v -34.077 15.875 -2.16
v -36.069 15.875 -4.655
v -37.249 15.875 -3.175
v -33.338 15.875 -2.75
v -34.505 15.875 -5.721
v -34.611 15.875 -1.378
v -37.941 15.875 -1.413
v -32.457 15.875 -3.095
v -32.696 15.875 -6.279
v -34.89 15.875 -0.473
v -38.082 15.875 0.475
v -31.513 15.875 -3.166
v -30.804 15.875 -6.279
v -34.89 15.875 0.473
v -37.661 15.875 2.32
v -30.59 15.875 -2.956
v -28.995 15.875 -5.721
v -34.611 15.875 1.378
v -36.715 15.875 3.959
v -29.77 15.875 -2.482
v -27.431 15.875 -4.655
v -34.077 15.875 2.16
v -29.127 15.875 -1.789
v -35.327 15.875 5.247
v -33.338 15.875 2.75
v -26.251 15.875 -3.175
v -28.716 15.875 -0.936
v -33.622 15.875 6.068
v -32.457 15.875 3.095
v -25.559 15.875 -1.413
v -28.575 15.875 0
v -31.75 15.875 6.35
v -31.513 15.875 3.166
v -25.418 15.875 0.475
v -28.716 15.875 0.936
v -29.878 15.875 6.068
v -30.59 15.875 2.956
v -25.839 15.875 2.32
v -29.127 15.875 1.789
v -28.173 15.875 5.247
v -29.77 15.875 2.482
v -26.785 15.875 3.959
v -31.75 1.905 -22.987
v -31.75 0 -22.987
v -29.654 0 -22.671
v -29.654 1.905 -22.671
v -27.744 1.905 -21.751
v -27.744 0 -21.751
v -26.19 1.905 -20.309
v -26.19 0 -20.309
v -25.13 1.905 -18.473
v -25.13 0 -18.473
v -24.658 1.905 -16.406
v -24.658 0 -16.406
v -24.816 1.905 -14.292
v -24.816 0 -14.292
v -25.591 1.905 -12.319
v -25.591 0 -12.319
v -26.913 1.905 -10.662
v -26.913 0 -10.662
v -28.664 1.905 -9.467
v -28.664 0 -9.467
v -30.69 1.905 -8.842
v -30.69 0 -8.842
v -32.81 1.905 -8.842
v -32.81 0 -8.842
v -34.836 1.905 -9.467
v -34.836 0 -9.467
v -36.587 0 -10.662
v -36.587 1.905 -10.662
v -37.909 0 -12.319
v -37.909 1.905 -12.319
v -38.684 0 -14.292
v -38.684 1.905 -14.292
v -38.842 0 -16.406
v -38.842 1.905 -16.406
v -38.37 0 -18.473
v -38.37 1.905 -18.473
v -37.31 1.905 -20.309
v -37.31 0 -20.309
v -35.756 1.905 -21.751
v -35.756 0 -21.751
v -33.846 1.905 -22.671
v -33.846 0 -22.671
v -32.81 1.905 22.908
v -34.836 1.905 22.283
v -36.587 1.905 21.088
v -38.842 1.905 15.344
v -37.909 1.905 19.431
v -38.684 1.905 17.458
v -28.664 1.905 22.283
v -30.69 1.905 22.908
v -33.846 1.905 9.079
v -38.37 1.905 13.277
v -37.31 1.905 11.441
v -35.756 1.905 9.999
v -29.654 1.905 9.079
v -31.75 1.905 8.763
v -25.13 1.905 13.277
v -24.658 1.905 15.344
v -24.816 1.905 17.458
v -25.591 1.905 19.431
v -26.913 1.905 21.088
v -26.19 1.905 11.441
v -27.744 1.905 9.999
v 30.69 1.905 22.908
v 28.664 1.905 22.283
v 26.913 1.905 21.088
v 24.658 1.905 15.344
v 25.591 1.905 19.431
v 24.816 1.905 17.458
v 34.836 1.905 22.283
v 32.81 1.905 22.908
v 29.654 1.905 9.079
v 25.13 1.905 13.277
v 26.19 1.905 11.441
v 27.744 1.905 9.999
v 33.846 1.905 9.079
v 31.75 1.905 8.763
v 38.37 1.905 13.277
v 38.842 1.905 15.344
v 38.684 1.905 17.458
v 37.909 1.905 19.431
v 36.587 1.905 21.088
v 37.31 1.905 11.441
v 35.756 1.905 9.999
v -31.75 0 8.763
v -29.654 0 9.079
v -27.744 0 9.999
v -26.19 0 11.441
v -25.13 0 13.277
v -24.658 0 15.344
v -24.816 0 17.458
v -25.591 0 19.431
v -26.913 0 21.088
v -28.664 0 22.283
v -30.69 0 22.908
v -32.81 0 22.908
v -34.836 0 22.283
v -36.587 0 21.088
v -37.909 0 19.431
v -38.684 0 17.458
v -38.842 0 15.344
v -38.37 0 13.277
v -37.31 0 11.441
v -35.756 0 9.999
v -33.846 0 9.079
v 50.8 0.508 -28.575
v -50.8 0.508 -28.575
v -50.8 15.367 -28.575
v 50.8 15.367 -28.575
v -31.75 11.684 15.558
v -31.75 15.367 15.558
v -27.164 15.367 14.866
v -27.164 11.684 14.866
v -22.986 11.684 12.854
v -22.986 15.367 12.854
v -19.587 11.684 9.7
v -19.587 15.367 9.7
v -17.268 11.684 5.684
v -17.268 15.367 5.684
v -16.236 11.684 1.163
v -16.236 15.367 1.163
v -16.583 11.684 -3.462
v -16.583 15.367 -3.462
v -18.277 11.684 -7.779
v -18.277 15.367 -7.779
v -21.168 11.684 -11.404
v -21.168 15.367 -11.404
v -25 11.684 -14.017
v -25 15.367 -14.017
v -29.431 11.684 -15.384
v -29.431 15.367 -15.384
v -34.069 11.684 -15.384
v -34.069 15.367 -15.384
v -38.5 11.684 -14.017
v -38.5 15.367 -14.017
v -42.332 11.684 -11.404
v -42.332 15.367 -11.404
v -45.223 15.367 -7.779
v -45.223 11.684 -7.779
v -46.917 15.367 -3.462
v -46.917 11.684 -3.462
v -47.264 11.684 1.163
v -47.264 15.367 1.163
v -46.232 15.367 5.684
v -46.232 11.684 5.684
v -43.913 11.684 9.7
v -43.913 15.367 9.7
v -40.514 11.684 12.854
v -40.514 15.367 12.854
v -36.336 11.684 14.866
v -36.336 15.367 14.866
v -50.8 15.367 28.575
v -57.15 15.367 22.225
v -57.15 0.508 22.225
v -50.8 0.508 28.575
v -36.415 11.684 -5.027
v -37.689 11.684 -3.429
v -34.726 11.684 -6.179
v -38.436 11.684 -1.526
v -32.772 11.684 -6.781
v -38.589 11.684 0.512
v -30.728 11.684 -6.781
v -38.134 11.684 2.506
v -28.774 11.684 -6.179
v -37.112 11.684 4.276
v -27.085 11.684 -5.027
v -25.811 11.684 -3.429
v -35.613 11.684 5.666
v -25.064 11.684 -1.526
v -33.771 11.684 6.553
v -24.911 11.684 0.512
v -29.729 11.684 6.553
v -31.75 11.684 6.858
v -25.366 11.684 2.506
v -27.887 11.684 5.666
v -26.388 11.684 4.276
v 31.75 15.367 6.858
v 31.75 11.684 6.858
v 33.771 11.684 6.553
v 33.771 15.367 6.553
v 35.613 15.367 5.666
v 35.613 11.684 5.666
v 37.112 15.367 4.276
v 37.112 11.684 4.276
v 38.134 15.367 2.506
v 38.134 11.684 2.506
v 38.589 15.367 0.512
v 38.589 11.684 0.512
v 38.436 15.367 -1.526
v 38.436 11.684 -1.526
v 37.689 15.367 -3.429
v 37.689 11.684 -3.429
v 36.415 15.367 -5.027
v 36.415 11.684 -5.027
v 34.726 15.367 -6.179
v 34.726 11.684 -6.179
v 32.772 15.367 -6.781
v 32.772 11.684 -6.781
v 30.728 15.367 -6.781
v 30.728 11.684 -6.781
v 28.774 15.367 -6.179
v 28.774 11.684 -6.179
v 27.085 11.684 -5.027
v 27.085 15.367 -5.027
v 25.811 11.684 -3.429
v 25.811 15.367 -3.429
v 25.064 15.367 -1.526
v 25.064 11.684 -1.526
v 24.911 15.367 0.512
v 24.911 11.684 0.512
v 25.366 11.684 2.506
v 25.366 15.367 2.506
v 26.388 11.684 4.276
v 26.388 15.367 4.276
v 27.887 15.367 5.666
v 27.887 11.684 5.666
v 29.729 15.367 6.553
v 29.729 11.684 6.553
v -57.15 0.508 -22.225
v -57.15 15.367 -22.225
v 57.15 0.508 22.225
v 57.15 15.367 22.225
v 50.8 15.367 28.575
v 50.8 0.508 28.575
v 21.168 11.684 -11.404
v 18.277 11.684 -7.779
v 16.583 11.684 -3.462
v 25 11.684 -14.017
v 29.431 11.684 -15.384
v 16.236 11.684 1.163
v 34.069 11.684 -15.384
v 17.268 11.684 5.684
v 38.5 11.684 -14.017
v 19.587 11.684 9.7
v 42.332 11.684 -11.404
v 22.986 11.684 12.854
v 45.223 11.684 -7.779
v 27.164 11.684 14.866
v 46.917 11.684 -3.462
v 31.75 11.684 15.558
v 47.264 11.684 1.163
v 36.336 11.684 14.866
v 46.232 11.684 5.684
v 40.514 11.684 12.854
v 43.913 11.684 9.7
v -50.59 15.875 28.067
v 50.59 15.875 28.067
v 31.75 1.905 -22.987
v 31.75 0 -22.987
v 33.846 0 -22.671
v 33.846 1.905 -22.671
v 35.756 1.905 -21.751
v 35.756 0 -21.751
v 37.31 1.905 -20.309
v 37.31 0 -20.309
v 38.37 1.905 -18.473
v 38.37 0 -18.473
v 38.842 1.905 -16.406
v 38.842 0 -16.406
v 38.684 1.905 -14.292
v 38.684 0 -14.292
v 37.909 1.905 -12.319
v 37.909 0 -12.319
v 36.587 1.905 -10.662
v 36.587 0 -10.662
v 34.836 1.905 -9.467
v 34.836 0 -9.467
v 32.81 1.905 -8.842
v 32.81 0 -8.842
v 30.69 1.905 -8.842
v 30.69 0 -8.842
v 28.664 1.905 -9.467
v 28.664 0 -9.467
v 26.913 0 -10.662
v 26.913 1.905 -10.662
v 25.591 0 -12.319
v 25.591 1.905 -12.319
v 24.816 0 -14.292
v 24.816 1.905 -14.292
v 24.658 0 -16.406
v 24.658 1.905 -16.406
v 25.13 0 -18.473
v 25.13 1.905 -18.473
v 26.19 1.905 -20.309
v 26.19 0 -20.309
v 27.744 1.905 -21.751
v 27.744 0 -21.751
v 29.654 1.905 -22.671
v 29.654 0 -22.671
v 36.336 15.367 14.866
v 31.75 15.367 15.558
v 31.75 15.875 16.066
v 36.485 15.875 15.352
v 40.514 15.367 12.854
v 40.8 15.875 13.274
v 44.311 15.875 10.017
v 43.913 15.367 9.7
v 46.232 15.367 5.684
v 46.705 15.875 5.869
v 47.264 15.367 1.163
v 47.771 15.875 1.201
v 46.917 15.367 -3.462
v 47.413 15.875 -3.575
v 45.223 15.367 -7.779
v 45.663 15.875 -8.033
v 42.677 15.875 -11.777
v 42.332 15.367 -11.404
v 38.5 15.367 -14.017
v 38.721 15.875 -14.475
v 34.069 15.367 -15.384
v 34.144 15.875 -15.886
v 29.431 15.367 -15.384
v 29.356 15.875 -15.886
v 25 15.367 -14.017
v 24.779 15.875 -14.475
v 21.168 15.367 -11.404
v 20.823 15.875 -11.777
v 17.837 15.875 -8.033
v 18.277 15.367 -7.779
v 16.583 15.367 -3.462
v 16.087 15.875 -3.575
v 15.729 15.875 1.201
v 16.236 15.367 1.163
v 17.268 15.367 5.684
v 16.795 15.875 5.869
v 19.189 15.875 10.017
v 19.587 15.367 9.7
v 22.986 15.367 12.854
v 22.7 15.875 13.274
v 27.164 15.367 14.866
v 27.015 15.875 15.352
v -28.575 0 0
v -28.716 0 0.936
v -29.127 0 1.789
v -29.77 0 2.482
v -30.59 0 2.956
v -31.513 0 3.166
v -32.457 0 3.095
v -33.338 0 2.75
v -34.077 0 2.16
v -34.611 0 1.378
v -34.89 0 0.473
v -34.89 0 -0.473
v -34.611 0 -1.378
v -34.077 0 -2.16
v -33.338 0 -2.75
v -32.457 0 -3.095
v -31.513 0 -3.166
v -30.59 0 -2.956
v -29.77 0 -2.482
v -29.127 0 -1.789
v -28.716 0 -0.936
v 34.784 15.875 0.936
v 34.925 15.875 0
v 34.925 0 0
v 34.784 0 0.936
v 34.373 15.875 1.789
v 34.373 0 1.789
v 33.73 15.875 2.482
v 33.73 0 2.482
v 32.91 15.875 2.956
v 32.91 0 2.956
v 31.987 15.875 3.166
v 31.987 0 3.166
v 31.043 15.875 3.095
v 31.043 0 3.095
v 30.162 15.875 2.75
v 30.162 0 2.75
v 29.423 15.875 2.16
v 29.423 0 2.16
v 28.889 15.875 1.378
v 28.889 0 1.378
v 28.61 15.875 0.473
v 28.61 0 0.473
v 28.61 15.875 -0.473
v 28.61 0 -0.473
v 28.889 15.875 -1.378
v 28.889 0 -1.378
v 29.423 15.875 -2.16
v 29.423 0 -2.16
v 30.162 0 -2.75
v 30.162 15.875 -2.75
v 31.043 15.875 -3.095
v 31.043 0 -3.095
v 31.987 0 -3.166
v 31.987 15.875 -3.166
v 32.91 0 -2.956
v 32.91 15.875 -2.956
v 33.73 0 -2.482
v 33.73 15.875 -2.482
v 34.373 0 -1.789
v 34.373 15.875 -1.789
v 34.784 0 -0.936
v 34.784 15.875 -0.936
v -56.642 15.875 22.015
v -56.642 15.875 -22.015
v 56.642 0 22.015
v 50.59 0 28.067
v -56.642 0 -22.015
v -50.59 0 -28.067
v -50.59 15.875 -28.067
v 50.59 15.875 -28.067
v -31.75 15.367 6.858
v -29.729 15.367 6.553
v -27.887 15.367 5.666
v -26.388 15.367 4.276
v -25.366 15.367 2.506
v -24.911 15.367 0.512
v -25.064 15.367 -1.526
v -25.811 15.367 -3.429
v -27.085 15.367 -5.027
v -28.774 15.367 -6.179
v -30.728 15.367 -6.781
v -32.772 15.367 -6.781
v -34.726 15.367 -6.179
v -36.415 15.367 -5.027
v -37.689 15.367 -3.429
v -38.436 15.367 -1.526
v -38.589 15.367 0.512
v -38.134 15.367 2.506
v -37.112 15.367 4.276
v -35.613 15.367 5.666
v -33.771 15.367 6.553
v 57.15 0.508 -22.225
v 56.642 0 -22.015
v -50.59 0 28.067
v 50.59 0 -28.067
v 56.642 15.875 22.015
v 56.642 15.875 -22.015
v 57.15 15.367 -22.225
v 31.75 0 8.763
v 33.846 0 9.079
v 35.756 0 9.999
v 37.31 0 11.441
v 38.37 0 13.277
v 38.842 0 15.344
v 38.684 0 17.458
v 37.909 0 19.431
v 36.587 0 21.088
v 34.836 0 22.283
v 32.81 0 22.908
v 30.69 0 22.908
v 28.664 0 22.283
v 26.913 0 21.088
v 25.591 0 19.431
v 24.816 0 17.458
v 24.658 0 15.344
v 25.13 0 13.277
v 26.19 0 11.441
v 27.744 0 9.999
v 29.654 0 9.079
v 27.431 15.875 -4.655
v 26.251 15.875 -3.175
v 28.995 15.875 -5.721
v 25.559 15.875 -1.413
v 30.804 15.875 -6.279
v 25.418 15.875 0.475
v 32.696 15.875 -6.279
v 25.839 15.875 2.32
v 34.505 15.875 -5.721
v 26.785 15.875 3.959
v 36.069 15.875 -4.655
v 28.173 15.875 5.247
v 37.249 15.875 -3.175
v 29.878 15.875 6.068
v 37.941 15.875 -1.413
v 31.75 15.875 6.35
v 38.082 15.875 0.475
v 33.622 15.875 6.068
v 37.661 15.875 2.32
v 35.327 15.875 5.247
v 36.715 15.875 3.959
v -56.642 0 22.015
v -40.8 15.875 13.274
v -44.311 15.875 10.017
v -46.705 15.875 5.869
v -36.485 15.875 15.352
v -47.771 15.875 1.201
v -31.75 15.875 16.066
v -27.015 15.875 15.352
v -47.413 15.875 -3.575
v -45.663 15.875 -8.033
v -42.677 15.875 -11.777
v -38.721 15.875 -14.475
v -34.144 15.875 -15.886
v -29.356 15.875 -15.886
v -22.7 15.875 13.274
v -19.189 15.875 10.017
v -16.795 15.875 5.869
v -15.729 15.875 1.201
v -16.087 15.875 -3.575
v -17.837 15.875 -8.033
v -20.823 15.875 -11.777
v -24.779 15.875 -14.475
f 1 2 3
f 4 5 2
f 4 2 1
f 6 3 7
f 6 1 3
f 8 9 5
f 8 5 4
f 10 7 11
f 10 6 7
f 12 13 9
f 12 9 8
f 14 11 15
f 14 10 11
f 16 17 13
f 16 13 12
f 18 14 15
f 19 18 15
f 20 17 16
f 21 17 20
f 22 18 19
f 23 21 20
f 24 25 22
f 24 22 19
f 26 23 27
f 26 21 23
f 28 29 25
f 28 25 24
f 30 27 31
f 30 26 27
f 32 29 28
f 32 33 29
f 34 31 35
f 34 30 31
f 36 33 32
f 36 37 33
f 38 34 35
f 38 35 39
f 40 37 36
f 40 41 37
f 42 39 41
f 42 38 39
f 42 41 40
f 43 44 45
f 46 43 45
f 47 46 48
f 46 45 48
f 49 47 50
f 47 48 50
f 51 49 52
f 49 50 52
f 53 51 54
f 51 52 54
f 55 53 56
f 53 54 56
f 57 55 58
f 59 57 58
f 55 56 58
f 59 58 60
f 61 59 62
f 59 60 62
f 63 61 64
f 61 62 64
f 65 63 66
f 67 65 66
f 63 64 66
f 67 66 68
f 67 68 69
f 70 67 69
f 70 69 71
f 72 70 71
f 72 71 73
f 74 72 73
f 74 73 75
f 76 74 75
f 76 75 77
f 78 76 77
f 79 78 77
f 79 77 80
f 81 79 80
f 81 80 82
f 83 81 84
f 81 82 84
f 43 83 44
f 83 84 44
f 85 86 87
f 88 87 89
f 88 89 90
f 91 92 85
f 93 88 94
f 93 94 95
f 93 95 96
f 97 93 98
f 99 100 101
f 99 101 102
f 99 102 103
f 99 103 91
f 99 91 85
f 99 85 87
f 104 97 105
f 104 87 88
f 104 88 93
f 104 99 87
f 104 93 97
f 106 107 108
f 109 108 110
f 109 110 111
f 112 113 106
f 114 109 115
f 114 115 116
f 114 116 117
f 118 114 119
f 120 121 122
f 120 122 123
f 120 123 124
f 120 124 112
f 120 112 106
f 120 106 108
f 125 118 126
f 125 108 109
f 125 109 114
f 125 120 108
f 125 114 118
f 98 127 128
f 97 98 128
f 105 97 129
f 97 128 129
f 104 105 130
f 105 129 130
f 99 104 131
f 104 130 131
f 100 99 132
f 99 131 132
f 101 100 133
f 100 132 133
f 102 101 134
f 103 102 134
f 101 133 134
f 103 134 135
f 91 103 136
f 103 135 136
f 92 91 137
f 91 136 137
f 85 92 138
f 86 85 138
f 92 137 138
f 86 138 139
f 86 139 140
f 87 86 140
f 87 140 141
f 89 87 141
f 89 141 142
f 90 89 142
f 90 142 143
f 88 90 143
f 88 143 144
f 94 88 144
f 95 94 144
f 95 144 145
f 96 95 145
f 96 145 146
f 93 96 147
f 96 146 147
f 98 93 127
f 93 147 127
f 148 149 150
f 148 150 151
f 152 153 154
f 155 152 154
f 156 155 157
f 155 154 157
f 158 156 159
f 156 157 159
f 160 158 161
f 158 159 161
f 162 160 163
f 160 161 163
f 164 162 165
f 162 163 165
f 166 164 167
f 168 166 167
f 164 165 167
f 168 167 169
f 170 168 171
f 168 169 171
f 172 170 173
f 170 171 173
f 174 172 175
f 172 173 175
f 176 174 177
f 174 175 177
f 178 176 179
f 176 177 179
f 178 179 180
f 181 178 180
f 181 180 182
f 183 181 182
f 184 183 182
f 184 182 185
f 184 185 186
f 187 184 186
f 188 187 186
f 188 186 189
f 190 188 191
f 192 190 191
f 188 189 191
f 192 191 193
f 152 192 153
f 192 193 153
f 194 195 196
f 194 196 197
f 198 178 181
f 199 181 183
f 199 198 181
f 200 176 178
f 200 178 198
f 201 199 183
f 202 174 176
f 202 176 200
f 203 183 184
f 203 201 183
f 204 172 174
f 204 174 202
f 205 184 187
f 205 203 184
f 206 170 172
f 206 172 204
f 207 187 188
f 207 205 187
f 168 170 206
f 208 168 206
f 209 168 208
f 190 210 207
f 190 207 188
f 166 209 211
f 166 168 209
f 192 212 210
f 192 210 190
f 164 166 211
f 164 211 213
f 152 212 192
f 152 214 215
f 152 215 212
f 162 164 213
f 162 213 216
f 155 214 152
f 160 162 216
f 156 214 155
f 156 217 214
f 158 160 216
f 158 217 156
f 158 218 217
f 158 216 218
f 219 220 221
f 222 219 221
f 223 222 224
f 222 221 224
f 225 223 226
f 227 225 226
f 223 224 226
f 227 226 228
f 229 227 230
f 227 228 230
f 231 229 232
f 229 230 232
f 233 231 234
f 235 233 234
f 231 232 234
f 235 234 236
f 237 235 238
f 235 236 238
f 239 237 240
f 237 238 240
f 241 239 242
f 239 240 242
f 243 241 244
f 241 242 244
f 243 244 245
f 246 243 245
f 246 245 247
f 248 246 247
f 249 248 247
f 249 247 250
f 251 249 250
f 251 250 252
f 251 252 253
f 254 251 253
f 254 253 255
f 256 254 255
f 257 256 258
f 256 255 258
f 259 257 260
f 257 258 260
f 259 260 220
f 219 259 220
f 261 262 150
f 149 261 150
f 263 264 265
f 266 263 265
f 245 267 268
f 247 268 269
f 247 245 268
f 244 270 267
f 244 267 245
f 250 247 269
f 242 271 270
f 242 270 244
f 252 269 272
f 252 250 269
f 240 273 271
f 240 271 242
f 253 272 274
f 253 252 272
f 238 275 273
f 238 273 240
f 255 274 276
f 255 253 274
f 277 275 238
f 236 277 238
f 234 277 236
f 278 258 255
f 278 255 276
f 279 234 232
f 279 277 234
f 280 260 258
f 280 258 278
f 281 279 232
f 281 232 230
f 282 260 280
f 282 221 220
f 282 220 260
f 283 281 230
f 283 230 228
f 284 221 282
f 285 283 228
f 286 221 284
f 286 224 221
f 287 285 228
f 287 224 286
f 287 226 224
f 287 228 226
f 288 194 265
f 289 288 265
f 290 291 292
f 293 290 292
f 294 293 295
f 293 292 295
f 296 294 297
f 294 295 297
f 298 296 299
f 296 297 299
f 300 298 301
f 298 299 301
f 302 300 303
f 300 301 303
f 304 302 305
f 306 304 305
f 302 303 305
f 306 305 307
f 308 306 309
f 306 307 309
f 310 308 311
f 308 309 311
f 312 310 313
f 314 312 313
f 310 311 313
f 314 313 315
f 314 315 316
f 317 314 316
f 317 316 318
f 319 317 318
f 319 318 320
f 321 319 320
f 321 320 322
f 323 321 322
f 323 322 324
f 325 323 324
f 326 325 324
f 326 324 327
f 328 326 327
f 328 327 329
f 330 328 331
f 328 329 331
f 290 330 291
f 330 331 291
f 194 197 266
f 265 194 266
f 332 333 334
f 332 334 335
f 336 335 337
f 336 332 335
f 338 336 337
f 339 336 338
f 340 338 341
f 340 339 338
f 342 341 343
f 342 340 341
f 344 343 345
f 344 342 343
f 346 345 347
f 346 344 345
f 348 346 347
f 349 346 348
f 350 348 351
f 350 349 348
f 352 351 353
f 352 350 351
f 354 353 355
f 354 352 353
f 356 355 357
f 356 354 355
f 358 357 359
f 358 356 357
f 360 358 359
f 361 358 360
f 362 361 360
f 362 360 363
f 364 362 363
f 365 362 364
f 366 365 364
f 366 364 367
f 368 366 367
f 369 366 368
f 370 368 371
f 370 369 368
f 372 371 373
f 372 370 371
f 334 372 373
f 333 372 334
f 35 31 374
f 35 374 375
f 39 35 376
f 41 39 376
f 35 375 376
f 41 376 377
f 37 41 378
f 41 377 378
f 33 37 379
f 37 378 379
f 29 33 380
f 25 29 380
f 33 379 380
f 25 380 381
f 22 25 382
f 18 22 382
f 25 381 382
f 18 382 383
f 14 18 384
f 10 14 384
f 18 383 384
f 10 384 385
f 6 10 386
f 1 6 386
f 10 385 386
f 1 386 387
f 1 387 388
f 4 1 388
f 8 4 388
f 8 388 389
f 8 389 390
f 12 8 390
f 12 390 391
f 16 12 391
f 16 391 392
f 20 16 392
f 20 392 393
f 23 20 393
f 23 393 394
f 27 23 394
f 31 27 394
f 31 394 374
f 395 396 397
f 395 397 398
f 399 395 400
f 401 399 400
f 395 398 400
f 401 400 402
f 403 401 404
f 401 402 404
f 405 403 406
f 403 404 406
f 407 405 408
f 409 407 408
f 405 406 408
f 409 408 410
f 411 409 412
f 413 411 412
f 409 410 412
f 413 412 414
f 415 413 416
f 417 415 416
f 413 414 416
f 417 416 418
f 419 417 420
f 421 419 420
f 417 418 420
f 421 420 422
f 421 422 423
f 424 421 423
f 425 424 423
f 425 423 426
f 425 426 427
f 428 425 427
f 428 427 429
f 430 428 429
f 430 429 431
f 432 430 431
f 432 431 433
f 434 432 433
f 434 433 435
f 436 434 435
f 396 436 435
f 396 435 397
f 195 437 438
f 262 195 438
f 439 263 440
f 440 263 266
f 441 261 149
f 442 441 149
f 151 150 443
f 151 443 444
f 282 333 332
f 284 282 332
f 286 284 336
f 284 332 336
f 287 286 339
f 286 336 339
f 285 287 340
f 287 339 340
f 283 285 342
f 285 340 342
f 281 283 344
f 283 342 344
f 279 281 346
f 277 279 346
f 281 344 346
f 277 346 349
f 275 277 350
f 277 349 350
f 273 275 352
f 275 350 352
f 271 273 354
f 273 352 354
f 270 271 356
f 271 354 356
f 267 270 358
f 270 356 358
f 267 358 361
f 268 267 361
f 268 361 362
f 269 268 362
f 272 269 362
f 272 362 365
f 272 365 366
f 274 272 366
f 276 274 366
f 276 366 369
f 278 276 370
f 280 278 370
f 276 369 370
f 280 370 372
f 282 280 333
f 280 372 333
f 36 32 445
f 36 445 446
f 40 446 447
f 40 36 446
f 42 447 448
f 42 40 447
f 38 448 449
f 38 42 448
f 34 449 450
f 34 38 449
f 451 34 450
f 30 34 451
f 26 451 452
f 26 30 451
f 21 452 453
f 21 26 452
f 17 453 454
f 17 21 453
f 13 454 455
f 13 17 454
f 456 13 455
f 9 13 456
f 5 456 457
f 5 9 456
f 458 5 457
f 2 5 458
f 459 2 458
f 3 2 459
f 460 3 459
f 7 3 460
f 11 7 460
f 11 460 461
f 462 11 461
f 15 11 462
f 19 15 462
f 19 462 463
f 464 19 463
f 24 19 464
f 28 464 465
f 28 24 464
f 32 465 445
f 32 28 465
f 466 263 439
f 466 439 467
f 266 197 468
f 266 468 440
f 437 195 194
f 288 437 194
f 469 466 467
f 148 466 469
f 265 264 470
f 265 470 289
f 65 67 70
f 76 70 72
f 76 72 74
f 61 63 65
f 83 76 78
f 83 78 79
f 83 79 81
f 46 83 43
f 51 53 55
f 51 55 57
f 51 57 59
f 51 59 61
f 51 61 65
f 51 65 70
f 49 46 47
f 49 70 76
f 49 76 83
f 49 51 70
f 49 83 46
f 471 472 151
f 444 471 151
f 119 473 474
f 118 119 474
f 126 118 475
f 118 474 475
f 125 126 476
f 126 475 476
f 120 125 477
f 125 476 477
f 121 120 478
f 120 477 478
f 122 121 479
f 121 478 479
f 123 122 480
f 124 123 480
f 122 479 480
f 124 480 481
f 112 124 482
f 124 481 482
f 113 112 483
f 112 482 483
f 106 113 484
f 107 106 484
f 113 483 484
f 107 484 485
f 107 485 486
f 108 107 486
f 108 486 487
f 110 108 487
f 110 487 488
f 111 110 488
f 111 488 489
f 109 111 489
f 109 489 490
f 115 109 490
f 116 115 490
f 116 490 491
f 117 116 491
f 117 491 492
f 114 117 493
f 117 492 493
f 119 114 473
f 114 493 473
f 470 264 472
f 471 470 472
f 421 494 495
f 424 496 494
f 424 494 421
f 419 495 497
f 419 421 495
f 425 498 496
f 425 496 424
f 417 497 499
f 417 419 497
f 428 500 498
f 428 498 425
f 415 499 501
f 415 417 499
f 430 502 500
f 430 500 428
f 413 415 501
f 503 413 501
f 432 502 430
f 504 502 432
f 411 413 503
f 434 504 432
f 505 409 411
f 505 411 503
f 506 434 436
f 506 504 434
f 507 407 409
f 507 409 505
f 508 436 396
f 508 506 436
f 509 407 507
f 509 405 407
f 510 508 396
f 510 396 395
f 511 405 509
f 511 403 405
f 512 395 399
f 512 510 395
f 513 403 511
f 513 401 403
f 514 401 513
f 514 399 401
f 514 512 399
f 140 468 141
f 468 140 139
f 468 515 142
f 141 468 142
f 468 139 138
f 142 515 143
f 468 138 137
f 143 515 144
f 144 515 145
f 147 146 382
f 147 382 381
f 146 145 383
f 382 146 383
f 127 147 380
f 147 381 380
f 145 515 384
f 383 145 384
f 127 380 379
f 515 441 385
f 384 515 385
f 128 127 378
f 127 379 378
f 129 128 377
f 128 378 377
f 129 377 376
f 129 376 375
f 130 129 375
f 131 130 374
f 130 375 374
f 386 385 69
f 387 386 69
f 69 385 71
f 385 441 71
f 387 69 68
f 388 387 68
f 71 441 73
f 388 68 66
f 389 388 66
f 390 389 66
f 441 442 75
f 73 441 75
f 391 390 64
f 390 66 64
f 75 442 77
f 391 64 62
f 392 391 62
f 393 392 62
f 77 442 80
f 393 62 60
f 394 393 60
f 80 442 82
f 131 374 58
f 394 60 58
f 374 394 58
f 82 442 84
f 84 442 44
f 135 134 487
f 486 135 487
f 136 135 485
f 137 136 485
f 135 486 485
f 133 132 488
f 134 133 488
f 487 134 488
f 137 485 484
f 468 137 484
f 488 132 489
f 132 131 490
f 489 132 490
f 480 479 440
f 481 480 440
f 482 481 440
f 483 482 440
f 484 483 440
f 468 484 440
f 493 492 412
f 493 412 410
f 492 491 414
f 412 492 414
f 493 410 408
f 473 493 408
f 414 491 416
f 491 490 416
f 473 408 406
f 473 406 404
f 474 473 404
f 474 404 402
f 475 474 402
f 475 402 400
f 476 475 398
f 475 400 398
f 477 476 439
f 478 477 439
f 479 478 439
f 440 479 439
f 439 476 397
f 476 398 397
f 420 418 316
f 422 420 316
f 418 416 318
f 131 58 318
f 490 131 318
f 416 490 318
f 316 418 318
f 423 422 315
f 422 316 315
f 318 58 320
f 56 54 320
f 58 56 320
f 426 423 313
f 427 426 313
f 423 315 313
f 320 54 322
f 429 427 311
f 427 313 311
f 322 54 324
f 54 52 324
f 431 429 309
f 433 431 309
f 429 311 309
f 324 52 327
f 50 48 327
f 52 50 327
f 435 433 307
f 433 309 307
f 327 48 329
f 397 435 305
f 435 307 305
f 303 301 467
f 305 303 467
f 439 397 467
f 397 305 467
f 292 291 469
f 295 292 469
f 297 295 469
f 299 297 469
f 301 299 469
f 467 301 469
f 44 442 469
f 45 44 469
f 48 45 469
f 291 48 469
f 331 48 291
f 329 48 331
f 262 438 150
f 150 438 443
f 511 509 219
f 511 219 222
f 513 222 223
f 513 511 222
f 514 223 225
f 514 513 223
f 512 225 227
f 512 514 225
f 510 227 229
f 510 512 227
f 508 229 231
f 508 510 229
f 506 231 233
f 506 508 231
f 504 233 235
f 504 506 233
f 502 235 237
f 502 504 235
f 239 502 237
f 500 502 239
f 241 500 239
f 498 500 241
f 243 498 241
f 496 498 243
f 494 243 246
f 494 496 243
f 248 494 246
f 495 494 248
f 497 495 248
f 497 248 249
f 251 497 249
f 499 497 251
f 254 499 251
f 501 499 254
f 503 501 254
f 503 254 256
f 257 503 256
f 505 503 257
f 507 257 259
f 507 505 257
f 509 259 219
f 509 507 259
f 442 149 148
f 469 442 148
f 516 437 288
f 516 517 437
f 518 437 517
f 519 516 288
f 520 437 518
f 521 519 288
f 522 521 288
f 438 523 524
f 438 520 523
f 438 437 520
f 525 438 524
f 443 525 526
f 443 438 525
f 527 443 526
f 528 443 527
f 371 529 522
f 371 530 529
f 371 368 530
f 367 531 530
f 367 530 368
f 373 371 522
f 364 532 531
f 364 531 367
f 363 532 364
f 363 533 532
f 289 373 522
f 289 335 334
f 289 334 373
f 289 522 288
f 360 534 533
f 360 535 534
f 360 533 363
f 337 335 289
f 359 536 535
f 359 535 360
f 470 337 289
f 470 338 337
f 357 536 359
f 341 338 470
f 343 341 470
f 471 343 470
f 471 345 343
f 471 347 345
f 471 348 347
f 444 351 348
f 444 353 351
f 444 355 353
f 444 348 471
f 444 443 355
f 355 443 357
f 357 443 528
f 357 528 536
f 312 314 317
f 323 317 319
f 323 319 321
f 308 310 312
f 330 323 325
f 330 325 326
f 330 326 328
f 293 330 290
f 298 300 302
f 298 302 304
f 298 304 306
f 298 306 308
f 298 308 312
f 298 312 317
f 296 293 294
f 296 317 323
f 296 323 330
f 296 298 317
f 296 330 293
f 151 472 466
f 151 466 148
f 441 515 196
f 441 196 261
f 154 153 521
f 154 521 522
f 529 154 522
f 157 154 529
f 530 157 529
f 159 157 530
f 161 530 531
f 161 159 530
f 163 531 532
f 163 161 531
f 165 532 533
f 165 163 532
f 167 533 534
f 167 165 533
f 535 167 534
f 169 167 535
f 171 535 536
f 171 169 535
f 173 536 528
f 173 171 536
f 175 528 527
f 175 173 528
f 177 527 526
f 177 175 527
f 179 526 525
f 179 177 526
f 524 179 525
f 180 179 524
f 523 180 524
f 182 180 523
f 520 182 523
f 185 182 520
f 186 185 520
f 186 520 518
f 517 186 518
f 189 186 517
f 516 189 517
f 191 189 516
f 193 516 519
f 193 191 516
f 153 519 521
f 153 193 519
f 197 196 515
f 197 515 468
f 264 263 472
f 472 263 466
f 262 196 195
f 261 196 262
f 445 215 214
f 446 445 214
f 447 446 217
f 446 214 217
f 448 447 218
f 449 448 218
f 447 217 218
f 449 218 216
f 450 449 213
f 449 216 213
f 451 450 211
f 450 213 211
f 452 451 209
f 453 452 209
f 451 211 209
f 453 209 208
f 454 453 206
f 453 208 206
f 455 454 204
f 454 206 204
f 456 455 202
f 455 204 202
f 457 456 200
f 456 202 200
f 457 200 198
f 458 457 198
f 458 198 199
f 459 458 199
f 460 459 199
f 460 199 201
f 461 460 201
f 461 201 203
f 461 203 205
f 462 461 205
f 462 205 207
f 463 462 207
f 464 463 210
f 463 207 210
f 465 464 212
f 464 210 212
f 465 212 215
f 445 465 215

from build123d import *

# Parameters (mm, degrees)
SKETCH1_W               = 114.3
SKETCH1_H               = 57.15
EXTRUDE1_DEPTH          = 15.875
CUT_EXTRUDE1_DEPTH      = 16.875
SKETCH4_R               = 15.5575
EXTRUDE7_DEPTH          = 4.191
SKETCH6_R               = 6.858
EXTRUDE8_DEPTH          = 4.191
CHAMFER1_SIZE           = 0.508
SKETCH7_R               = 7.112
CUT_EXTRUDE2_DEPTH      = 1.905
F_1_4_20_TAPPED_HOLE1_D = 6.35


with BuildPart() as part:
    # Sketch1 → Extrude1 (new body)
    with BuildSketch(Plane(origin=(0, 0, 0), x_dir=(1, 0, 0), z_dir=(0, 1, 0))):
        Rectangle(SKETCH1_W, SKETCH1_H)
    extrude(amount=EXTRUDE1_DEPTH)

    # Sketch3 → Cut-Extrude1 (cut, through all)
    with BuildSketch(Plane(origin=(0, 15.875, 0), x_dir=(1, 0, 0), z_dir=(0, 1, 0))):
        Polygon((-57.15, 22.225), (-50.8, 28.575), (-57.15, 28.575), align=None)
        Polygon((-57.15, -28.575), (-57.15, -22.225), (-50.8, -28.575), align=None)
        Polygon((57.15, -28.575), (57.15, -22.225), (50.8, -28.575), align=None)
        Polygon((57.15, 28.575), (57.15, 22.225), (50.8, 28.575), align=None)
    extrude(amount=-CUT_EXTRUDE1_DEPTH, mode=Mode.SUBTRACT)

    # Sketch4 → Extrude7 (cut)
    with BuildSketch(Plane(origin=(0, 15.875, 0), x_dir=(1, 0, 0), z_dir=(0, 1, 0))):
        with Locations(Location((-31.75, 0, 0), (0, 0, 270))):  # turned: the seam where the file's is
            Circle(SKETCH4_R)
        with Locations(Location((31.75, 0, 0), (0, 0, 270))):  # turned: the seam where the file's is
            Circle(SKETCH4_R)
    extrude(amount=-EXTRUDE7_DEPTH, mode=Mode.SUBTRACT)

    # Sketch6 → Extrude8 (add)
    with BuildSketch(Plane(origin=(0, 11.684, 0), x_dir=(1, 0, 0), z_dir=(0, 1, 0))):
        with Locations(Location((-31.75, 0, 0), (0, 0, 270))):  # turned: the seam where the file's is
            Circle(SKETCH6_R)
        with Locations(Location((31.75, 0, 0), (0, 0, 270))):  # turned: the seam where the file's is
            Circle(SKETCH6_R)
    extrude(amount=EXTRUDE8_DEPTH)

    # Chamfer1
    chamfer1_edges = [part.edges().sort_by_distance(p)[0] for p in [
        (-57.15, 0, 0),
        (-57.15, 15.875, 0),
        (-53.975, 0, -25.4),
        (-53.975, 15.875, -25.4),
        (0, 0, 28.575),
        (0, 15.875, 28.575),
        (-53.975, 0, 25.4),
        (-53.975, 15.875, 25.4),
        (57.15, 0, 0),
        (57.15, 15.875, 0),
        (53.975, 0, 25.4),
        (53.975, 15.875, 25.4),
        (0, 0, -28.575),
        (0, 15.875, -28.575),
        (53.975, 0, -25.4),
        (53.975, 15.875, -25.4),
        (-31.75, 15.875, -15.5575),
        (31.75, 15.875, -15.5575),
        (-31.75, 15.875, -6.858),
        (31.75, 15.875, -6.858),
    ]]
    chamfer(chamfer1_edges, length=CHAMFER1_SIZE)

    # Sketch7 → Cut-Extrude2 (cut)
    with BuildSketch(Plane.XZ):
        with Locations(Location((-31.75, 15.875, 0), (0, 0, 270))):  # turned: the seam where the file's is
            Circle(SKETCH7_R)
        with Locations(Location((-31.75, -15.875, 0), (0, 0, 270))):  # turned: the seam where the file's is
            Circle(SKETCH7_R)
        with Locations(Location((31.75, 15.875, 0), (0, 0, 270))):  # turned: the seam where the file's is
            Circle(SKETCH7_R)
        with Locations(Location((31.75, -15.875, 0), (0, 0, 270))):  # turned: the seam where the file's is
            Circle(SKETCH7_R)
    extrude(amount=-CUT_EXTRUDE2_DEPTH, mode=Mode.SUBTRACT)

    # 1/4-20 Tapped Hole1 (through all)
    with Locations(Plane(origin=(0, 15.875, 0), x_dir=(-1, 0, 0), z_dir=(0, 1, 0))):
        with Locations((31.75, 0), (-31.75, 0)):
            Hole(F_1_4_20_TAPPED_HOLE1_D / 2)


solid = part.part
